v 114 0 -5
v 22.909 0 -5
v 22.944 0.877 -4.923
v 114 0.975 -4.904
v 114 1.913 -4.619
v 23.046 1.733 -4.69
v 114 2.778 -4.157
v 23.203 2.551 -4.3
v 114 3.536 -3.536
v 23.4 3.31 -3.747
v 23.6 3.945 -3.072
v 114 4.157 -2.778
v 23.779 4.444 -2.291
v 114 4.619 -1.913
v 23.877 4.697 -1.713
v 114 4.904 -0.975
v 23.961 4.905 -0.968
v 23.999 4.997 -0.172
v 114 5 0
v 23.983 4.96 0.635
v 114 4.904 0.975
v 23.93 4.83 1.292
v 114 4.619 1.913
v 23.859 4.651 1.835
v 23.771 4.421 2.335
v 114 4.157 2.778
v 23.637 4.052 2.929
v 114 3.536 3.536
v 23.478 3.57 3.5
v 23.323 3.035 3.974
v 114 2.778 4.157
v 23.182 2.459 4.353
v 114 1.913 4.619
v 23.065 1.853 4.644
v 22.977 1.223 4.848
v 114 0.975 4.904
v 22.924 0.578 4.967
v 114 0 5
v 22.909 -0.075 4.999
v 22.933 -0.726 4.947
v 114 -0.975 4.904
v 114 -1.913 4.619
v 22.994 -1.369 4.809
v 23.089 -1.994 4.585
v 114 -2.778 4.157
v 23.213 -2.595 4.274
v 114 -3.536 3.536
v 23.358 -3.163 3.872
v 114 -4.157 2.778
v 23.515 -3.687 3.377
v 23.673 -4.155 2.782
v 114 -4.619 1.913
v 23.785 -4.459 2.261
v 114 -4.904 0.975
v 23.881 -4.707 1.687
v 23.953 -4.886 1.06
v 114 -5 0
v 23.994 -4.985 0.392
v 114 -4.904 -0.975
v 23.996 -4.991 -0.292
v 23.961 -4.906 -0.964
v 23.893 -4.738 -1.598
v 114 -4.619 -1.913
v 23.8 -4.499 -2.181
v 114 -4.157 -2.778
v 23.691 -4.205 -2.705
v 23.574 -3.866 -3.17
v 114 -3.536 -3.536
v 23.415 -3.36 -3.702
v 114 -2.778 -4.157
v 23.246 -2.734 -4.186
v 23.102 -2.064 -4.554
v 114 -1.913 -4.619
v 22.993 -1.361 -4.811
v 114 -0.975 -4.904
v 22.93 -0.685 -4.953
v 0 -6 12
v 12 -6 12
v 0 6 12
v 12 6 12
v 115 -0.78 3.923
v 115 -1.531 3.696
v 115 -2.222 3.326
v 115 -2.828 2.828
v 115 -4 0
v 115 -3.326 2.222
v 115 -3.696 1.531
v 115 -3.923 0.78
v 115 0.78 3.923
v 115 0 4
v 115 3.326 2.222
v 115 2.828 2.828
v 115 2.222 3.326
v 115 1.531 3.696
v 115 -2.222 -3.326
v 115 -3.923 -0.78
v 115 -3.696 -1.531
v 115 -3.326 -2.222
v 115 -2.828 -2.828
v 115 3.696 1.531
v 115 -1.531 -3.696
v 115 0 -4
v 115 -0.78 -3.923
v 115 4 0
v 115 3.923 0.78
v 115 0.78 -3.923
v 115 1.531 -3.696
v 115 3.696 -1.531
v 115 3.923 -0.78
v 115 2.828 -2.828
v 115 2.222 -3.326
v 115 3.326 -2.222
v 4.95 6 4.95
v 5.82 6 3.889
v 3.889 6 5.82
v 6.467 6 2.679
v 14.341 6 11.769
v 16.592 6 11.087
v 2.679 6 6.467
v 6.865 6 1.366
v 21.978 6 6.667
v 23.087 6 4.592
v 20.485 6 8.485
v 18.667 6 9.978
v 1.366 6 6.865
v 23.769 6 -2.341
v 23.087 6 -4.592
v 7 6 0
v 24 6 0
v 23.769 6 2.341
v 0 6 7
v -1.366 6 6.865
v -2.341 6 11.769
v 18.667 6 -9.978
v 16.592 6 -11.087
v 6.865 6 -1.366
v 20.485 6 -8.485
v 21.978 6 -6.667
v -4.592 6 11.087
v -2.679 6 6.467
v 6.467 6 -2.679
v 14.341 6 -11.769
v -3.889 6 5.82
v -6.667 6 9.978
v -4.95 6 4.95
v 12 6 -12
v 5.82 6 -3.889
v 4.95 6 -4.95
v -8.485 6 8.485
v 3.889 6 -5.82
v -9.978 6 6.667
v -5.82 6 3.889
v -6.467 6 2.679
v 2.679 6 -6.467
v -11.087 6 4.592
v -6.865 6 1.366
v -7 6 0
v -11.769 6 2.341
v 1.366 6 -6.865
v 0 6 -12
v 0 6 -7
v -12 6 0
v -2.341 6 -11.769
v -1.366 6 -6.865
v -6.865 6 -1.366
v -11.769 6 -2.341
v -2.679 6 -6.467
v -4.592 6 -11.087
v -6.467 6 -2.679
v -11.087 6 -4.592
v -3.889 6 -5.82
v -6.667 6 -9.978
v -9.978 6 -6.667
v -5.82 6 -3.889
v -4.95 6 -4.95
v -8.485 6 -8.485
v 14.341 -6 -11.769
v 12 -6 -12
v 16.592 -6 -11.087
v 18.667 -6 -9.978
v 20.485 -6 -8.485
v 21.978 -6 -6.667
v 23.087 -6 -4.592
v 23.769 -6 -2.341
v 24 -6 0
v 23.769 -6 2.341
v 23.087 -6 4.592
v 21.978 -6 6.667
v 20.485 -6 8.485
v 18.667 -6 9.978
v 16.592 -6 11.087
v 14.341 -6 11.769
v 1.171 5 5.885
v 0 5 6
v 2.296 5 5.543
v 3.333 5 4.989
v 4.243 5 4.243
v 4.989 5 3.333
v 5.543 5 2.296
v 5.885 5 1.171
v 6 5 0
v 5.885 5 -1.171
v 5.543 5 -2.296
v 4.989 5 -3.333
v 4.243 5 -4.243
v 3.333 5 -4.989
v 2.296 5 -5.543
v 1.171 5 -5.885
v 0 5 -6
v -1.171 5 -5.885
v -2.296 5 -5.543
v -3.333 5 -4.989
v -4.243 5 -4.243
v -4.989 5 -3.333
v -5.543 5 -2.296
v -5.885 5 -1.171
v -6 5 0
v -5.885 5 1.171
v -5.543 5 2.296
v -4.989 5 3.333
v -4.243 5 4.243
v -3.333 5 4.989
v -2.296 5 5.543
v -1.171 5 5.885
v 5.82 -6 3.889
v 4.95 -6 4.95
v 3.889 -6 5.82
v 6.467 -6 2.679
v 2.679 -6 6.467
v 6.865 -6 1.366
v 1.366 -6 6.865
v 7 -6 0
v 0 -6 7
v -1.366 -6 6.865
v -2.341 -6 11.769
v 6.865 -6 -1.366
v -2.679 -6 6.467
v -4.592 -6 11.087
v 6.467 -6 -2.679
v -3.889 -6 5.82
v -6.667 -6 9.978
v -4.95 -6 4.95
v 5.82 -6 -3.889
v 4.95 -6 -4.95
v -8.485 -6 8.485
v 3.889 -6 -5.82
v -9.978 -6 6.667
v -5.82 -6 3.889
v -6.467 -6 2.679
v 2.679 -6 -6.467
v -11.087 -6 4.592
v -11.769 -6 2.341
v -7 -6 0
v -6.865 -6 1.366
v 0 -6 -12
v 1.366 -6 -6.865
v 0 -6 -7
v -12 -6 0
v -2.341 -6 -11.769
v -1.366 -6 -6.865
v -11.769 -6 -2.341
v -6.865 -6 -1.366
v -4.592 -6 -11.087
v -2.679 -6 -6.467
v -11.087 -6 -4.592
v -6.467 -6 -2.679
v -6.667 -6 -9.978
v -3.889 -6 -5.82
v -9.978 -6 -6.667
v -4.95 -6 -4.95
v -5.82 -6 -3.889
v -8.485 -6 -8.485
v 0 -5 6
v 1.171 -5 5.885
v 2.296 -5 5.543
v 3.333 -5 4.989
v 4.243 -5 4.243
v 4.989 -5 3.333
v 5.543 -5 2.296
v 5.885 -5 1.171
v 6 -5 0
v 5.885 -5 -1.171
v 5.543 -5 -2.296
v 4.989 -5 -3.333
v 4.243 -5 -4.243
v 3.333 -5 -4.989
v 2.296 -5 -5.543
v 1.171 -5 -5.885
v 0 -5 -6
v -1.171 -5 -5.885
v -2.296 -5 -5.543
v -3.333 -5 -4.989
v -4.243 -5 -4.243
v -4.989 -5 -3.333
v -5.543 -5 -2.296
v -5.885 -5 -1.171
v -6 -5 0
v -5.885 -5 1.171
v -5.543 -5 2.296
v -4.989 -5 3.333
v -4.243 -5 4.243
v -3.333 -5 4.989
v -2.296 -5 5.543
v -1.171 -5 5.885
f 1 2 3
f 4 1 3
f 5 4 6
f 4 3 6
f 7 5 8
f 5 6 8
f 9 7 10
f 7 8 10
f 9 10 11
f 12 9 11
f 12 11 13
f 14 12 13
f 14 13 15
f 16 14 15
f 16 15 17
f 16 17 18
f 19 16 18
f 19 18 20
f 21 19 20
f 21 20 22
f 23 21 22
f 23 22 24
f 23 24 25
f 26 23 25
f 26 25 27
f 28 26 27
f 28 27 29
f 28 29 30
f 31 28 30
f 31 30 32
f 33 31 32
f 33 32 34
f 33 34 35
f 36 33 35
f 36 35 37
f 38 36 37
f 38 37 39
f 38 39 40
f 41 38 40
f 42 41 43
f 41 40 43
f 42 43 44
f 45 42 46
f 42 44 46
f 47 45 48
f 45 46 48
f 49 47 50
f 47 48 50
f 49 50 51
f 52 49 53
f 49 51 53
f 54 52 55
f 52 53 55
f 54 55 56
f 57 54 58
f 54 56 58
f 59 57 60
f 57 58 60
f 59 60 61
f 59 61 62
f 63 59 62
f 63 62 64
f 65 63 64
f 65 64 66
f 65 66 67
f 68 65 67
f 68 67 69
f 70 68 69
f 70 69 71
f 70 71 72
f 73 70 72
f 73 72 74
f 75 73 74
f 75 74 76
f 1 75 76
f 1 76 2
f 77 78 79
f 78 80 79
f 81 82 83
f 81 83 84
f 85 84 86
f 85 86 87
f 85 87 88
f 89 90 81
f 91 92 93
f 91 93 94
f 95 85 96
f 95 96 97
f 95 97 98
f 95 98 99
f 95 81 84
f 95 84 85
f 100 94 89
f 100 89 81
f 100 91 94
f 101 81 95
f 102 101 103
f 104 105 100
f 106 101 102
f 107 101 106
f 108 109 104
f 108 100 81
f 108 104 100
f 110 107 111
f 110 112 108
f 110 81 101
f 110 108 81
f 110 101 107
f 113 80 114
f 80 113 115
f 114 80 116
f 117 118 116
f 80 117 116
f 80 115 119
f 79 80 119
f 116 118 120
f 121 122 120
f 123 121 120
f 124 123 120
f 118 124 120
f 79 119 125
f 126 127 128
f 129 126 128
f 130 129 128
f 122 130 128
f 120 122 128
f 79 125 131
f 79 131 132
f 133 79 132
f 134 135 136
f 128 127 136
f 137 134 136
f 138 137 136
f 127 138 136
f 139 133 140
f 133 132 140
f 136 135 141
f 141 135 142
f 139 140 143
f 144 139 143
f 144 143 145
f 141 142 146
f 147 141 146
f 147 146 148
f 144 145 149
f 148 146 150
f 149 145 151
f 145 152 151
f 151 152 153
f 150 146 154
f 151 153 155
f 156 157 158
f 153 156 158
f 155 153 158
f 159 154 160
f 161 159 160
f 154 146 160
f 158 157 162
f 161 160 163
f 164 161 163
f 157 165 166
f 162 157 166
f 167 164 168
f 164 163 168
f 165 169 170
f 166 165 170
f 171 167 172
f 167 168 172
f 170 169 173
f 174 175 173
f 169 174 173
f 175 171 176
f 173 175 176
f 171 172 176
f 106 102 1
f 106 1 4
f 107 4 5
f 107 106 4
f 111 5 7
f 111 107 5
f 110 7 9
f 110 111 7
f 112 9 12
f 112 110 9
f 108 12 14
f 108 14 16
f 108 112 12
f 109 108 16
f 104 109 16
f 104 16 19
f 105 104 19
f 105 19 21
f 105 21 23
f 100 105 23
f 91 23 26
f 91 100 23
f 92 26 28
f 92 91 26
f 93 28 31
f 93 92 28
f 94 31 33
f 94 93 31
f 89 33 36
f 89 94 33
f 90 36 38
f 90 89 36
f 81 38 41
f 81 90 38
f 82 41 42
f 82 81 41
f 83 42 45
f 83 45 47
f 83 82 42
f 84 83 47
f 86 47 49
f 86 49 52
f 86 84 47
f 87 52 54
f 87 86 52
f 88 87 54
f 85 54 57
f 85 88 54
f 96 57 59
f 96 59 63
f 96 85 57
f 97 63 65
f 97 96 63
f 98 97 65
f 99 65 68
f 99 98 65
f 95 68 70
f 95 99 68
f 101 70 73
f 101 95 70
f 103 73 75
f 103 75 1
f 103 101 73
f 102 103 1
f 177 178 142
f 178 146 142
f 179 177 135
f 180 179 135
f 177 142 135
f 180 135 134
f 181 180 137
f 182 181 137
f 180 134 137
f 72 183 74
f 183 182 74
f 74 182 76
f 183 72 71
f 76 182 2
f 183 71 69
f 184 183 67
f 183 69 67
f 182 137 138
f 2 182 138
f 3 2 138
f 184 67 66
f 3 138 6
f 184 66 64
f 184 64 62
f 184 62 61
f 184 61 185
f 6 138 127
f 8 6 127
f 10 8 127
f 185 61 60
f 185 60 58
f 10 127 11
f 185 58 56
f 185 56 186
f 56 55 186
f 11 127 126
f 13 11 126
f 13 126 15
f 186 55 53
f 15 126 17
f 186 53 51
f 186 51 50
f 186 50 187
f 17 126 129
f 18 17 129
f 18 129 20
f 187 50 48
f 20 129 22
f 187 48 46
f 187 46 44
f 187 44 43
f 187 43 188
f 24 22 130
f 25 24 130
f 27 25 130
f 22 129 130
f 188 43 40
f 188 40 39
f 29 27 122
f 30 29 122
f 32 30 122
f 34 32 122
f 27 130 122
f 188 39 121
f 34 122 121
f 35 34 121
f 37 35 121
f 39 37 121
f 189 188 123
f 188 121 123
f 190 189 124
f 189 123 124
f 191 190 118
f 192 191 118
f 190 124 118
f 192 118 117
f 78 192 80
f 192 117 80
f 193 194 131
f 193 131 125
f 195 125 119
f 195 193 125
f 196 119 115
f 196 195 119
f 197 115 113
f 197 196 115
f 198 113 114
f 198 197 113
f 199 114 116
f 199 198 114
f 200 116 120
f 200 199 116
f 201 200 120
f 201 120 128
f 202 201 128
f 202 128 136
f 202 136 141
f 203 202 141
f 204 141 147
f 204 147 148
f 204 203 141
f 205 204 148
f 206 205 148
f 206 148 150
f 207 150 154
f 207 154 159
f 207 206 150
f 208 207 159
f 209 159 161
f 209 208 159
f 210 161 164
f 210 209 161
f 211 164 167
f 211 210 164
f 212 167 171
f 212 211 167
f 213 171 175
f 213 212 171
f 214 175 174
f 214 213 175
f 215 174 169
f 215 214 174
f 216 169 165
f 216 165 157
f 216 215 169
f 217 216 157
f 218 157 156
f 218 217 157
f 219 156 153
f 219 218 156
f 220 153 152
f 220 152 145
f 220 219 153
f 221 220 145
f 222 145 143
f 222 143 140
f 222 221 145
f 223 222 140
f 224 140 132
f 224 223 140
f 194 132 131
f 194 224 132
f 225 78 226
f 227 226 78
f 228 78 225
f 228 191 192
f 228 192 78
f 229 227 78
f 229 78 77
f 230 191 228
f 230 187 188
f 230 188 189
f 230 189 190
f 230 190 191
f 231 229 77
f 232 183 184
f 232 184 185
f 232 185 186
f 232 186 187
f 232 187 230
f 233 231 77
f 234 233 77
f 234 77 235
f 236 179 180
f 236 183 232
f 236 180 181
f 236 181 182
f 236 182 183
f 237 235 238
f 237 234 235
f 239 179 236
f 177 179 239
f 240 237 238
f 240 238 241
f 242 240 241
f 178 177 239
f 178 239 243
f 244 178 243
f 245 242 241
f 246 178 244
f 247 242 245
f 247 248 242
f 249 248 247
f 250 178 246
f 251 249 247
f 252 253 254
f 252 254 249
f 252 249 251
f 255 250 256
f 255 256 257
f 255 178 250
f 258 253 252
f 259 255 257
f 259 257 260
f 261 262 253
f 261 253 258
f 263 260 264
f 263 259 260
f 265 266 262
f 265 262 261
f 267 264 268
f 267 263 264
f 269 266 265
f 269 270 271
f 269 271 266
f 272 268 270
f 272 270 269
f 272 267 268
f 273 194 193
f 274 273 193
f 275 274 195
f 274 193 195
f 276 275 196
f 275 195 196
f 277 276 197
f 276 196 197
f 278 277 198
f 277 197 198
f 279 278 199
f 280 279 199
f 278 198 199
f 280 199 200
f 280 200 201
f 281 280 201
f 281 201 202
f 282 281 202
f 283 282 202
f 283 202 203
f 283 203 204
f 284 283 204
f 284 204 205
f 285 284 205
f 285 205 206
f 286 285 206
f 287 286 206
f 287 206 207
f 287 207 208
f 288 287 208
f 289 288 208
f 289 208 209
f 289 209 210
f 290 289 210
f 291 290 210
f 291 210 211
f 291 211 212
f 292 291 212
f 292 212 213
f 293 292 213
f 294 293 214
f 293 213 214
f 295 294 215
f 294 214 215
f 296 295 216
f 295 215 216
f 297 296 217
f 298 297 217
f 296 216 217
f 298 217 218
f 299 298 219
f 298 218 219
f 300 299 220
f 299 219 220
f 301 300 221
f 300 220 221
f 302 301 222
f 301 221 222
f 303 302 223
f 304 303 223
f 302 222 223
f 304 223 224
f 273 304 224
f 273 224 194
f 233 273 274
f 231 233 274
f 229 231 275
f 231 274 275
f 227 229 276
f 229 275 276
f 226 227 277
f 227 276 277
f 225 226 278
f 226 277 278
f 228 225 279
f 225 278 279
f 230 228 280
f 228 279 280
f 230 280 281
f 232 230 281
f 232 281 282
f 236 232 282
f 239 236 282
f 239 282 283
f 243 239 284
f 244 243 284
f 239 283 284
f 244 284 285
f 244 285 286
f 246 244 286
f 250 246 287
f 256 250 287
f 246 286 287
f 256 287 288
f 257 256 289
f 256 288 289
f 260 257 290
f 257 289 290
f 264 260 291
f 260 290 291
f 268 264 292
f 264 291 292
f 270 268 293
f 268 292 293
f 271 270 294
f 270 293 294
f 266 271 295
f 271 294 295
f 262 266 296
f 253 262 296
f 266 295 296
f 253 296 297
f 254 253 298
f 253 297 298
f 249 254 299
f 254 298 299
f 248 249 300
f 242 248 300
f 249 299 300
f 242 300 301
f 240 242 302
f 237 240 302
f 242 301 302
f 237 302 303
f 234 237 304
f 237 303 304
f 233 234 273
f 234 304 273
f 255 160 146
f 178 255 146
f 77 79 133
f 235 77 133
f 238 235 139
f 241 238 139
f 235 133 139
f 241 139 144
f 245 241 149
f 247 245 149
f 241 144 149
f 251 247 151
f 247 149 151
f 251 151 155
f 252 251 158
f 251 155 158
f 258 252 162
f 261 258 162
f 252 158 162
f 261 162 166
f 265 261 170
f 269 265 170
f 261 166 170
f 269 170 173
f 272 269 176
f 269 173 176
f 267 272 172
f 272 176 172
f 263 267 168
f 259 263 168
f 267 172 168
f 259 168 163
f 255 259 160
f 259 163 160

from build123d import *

# Parameters (mm, degrees)
SCHIZZO1_R                   = 5
ESTRUSIONE_ESTRUSIONE1_DEPTH = 115
ESTRUSIONE_ESTRUSIONE2_DEPTH = 6
TAGLIO_ESTRUSIONE1_REACH     = 118.245
SCHIZZO3_R                   = 6
SMUSSO1_SIZE                 = 1


with BuildPart() as part:
    # Schizzo1 → Estrusione-Estrusione1 (new body)
    with BuildSketch(Plane(origin=(0, 0, 0), x_dir=(0, 0, -1), z_dir=(1, 0, 0))):
        Circle(SCHIZZO1_R)
    extrude(amount=ESTRUSIONE_ESTRUSIONE1_DEPTH)

    # Schizzo2 → Estrusione-Estrusione2 (add, symmetric)
    with BuildSketch(Plane(origin=(0, 0, 0), x_dir=(1, 0, 0), z_dir=(0, 1, 0))):
        with BuildLine():
            Line((0, 12), (12, 12))
            ThreePointArc((12, 12), (24, 0), (12, -12))
            Line((12, -12), (0, -12))
            ThreePointArc((0, -12), (-12, 0), (0, 12))
        make_face()
    extrude(amount=ESTRUSIONE_ESTRUSIONE2_DEPTH, both=True)

    # Schizzo3 → Taglio-Estrusione1 (cut, up to next)
    with BuildSketch(Plane(origin=(0, 6, 0), x_dir=(1, 0, 0), z_dir=(0, 1, 0)), mode=Mode.PRIVATE) as taglio_estrusione1_sk1:
        with Locations(Location((0, 0, 0), (0, 0, 270))):
            Circle(SCHIZZO3_R)
    taglio_estrusione1_tool1 = extrude(taglio_estrusione1_sk1.sketch, amount=-TAGLIO_ESTRUSIONE1_REACH, mode=Mode.PRIVATE) & part.part
    add(taglio_estrusione1_tool1.solids().sort_by_distance((0, 6, 0))[0], mode=Mode.SUBTRACT)

    # Smusso1
    smusso1_edges = [part.edges().sort_by_distance(p)[0] for p in [
        (0, 6, -6),
        (0, -6, -6),
        (115, 0, 5),
    ]]
    chamfer(smusso1_edges, length=SMUSSO1_SIZE)


solid = part.part
